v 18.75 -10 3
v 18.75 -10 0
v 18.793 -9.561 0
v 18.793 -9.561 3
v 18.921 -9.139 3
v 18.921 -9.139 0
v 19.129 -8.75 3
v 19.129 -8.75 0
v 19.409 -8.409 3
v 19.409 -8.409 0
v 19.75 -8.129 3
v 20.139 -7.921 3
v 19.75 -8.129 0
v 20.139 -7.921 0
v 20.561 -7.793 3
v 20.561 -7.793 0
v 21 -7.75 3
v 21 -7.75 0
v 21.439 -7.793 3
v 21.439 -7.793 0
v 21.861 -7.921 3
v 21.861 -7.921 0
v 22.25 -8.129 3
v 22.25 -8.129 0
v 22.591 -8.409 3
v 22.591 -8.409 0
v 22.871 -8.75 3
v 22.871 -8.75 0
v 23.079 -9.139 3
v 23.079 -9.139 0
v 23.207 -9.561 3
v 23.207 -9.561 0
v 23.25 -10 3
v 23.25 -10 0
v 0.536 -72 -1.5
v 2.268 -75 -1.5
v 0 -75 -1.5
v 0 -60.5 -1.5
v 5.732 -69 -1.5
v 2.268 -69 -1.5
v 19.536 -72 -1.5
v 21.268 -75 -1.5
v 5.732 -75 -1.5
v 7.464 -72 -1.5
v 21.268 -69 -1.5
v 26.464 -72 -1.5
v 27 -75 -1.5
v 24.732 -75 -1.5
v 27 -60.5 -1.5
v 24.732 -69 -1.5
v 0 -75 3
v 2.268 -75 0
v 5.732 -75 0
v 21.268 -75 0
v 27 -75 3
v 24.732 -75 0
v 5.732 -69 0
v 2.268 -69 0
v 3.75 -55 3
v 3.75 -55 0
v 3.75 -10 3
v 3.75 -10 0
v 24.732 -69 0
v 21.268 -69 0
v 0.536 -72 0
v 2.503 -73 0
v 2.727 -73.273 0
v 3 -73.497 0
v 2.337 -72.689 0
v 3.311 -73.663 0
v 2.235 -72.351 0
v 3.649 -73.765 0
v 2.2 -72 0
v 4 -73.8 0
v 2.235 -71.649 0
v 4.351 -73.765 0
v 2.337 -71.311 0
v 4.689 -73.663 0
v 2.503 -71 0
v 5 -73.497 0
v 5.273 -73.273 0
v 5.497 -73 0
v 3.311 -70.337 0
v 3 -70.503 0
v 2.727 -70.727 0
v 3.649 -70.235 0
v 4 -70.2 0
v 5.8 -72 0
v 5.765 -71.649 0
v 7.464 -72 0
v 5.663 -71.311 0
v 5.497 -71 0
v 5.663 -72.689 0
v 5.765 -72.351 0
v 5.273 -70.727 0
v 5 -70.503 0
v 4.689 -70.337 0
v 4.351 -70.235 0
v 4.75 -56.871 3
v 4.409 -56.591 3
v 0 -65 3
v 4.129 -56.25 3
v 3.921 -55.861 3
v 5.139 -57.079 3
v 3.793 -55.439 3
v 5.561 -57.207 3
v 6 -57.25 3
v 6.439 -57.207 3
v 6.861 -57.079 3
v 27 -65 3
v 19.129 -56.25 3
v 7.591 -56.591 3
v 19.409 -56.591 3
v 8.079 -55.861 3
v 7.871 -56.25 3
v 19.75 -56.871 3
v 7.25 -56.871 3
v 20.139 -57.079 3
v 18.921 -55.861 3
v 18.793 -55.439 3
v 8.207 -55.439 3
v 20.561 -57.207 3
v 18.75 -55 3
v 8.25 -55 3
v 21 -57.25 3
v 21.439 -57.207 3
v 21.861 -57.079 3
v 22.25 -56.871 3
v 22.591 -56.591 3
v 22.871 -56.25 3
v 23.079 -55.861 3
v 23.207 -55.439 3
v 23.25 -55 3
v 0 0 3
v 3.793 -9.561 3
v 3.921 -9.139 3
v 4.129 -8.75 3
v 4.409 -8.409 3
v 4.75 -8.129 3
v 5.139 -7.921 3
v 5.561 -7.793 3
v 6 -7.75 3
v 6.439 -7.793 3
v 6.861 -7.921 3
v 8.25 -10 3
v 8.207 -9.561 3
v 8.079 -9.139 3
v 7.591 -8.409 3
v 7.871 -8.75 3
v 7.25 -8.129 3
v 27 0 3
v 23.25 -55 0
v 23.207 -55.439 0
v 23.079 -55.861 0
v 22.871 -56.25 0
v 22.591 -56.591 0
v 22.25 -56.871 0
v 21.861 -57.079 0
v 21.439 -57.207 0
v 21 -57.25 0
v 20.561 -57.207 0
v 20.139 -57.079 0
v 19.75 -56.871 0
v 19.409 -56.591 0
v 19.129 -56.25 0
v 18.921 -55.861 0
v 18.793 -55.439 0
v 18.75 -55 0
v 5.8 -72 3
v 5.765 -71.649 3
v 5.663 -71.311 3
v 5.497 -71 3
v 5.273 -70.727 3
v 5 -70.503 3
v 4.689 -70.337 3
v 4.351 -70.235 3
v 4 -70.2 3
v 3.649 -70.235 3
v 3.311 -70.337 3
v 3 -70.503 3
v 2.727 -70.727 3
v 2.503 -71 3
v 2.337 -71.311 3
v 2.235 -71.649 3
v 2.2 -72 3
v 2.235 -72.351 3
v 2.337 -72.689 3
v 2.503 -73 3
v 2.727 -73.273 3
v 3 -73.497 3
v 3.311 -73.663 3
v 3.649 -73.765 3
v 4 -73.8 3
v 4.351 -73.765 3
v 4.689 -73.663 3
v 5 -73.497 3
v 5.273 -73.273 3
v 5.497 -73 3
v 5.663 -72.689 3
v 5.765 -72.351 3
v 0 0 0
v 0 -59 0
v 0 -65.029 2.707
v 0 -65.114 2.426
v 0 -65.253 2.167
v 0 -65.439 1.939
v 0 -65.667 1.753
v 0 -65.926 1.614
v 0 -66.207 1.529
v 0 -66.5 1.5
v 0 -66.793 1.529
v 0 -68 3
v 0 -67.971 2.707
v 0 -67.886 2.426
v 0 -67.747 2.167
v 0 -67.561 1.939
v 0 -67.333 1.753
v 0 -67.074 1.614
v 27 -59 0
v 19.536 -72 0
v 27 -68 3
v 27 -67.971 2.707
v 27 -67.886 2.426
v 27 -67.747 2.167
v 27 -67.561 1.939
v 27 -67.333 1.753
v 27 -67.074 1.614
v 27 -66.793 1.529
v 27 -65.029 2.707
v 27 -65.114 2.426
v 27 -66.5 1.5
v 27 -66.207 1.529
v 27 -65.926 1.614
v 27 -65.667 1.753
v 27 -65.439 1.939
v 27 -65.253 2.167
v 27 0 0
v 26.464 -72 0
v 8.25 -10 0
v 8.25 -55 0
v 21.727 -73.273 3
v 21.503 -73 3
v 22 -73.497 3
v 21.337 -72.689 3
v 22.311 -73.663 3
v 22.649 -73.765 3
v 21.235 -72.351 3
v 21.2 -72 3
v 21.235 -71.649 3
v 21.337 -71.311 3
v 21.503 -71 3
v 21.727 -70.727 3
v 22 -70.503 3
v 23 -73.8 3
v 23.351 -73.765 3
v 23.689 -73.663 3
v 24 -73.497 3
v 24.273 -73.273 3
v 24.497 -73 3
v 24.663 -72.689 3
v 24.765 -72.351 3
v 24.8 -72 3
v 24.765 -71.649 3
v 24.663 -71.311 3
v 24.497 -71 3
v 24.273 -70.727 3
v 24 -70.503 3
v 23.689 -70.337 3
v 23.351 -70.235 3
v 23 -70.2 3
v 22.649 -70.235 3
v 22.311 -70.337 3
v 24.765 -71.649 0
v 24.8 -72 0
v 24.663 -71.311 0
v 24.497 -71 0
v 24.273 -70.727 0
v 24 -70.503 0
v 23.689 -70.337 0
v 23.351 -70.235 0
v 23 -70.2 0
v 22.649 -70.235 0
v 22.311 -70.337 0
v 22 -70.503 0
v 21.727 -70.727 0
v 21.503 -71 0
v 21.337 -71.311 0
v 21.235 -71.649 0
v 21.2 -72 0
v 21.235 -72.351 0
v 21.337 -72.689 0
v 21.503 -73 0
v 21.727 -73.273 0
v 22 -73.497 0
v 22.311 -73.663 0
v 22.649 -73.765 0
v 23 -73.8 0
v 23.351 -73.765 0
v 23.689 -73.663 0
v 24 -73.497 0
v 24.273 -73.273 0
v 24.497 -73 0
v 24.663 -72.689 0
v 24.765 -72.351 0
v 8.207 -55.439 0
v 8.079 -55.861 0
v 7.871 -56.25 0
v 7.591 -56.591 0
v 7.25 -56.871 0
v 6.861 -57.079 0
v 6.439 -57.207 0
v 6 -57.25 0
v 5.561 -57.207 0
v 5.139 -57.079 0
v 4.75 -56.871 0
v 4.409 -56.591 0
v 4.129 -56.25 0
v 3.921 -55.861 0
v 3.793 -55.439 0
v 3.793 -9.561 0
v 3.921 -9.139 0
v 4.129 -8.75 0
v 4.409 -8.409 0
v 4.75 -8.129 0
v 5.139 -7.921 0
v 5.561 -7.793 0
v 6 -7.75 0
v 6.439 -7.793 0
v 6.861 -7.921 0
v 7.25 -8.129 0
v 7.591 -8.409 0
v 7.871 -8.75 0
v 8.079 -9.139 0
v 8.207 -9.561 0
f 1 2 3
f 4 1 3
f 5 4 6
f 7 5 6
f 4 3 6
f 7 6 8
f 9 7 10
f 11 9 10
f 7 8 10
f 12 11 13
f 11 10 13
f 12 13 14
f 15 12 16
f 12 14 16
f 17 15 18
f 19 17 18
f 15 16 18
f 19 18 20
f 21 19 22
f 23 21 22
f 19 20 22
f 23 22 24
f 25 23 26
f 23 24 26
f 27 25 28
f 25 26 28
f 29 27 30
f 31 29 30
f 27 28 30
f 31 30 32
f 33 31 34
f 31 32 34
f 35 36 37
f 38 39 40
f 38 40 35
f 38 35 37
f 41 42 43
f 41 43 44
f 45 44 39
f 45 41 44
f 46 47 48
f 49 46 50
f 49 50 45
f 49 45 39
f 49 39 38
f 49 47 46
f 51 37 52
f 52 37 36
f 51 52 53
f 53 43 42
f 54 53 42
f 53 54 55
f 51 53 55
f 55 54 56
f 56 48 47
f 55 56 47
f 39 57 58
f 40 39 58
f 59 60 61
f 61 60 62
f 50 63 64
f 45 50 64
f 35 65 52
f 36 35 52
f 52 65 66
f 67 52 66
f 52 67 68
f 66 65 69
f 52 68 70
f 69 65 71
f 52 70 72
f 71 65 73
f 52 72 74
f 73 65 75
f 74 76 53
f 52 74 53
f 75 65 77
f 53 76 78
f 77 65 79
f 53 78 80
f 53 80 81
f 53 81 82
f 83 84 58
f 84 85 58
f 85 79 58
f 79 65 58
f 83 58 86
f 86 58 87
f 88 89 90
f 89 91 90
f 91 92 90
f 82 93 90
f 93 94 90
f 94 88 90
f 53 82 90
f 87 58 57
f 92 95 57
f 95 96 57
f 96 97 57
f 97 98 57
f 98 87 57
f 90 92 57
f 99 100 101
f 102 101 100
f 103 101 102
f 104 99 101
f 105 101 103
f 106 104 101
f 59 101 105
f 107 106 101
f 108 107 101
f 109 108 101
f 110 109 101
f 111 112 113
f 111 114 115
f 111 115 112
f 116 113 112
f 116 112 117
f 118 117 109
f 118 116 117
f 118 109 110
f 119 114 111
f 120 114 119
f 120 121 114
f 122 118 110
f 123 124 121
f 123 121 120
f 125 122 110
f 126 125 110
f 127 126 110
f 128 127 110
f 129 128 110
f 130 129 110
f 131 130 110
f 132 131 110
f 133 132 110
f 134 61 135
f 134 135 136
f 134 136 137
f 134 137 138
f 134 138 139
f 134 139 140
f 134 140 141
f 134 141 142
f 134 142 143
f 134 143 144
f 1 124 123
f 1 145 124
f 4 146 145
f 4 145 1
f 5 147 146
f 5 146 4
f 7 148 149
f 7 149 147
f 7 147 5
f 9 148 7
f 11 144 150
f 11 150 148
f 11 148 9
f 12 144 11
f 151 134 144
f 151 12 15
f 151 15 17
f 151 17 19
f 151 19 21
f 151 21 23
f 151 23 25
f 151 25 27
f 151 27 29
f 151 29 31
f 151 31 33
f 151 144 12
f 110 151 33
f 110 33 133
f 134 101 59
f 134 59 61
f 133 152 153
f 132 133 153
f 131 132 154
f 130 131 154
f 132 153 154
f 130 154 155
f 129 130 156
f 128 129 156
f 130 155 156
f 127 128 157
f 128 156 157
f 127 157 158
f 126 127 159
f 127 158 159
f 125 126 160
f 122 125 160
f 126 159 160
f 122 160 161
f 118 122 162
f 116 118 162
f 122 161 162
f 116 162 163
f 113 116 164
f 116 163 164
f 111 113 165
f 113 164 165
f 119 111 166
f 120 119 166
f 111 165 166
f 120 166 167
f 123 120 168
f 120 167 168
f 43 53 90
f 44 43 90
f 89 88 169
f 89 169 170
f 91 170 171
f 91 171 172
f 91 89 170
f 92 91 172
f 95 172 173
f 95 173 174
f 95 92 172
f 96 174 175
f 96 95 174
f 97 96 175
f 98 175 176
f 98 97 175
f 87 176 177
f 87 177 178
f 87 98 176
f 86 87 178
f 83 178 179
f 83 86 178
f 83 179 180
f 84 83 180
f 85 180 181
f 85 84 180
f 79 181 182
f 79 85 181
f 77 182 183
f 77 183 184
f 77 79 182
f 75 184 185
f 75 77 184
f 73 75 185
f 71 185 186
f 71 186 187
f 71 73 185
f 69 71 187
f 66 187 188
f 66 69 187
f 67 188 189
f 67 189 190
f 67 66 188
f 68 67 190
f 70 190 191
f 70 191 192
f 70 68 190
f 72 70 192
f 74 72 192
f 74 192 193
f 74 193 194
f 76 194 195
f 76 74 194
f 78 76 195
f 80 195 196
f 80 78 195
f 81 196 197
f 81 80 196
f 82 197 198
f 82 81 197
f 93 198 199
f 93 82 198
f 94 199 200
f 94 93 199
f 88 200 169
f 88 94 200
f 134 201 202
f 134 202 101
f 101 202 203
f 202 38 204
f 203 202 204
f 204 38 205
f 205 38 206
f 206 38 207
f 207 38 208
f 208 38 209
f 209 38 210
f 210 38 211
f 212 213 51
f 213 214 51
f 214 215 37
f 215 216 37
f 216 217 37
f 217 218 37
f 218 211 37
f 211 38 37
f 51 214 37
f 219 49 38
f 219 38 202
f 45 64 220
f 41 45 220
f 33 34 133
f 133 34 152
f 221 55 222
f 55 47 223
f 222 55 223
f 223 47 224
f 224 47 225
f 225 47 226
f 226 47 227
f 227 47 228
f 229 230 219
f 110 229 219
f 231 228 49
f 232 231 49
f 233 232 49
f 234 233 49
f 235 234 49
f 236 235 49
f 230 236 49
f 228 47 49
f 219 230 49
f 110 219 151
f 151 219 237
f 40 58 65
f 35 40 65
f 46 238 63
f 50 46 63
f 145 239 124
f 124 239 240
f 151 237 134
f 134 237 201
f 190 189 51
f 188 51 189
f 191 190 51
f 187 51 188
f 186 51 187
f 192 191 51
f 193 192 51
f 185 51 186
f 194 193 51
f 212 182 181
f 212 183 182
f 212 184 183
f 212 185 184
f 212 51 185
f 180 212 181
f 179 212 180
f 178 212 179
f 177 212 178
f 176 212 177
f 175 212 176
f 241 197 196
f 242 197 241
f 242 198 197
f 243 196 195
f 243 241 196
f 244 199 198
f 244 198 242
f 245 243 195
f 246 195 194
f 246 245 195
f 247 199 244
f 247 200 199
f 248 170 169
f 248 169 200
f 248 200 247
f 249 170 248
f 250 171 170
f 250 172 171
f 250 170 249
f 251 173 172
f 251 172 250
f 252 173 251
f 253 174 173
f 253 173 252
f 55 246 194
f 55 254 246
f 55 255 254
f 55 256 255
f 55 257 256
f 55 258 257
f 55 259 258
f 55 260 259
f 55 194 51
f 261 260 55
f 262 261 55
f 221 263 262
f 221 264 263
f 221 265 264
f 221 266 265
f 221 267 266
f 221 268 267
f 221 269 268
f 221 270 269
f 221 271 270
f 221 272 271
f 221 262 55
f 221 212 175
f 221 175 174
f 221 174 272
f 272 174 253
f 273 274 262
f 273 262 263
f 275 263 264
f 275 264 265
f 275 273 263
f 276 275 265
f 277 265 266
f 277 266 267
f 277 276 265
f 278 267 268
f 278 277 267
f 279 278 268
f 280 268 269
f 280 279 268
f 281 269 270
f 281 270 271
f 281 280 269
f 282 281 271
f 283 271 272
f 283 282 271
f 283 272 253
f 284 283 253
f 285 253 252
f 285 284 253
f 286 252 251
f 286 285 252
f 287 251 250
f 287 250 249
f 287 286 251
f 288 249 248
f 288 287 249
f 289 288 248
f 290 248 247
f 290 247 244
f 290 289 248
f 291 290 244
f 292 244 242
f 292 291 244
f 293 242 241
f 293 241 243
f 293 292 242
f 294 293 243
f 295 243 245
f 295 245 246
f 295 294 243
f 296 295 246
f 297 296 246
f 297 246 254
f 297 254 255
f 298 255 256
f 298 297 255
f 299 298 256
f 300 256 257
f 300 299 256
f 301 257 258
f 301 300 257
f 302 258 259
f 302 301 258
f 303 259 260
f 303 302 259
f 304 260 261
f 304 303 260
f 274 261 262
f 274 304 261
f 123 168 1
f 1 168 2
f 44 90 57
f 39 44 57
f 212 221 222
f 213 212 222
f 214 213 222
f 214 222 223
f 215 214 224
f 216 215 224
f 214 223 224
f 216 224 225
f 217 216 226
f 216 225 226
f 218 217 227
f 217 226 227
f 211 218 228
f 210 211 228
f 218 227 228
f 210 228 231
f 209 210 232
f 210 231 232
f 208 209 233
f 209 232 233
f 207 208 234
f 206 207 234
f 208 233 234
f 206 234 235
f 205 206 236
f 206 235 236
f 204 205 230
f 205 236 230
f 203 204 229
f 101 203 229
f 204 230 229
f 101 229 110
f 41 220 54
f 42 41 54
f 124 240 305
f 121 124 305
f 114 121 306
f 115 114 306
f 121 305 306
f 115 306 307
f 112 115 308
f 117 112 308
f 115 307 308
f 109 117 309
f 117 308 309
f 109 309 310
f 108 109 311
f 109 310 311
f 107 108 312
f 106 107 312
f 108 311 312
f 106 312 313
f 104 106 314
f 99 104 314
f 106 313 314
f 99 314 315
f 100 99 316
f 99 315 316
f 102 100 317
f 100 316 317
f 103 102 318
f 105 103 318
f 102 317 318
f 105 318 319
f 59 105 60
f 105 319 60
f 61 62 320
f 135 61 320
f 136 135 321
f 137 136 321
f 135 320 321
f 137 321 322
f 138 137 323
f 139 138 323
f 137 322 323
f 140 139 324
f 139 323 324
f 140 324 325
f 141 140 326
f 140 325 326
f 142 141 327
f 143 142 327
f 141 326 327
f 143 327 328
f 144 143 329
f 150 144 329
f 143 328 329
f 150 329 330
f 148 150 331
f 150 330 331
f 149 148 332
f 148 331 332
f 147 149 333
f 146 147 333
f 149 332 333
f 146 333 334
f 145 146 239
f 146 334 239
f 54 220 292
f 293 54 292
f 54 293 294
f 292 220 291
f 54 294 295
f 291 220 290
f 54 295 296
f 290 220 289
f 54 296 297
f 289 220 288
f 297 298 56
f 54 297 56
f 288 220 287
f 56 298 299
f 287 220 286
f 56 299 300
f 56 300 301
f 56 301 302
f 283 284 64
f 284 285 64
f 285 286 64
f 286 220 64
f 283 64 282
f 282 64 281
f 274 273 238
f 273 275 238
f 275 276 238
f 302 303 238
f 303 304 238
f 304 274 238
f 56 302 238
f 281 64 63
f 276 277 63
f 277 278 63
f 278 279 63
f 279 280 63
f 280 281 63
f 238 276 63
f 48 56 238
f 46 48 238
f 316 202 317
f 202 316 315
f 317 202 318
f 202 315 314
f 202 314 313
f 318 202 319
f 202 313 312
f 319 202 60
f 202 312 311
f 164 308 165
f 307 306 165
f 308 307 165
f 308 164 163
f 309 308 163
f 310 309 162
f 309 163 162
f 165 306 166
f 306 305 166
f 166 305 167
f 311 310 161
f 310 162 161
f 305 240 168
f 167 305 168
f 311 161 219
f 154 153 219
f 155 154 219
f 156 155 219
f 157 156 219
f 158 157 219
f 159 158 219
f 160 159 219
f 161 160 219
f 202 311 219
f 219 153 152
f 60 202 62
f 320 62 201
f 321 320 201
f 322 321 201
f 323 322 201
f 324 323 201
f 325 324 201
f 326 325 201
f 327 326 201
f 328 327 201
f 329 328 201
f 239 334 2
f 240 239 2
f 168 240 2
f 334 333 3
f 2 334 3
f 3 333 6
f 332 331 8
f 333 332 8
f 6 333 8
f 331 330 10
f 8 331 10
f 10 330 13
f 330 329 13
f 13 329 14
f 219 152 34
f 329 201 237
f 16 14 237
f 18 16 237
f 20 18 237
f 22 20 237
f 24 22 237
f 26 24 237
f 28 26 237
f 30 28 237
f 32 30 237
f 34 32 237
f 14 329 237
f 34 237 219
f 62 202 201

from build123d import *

# Parameters (mm, degrees)
F0_R     = 1.8
F1_DEPTH = 3
F3_DEPTH = 27
F4_DEPTH = 27
F5_DEPTH = 1.5


with BuildPart() as f1:
    # F0 (on Top) → F1 (new body)
    with BuildSketch(Plane.XY):
        Polygon((27, 0), (0, 0), (0, -75), (2.2679491924, -75), (0.5358983849, -72), (2.2679491924, -69), (5.7320508076, -69), (7.4641016151, -72), (5.7320508076, -75), (21.2679491924, -75), (19.5358983849, -72), (21.2679491924, -69), (24.7320508076, -69), (26.4641016151, -72), (24.7320508076, -75), (27, -75), align=None)
        with BuildLine():
            Line((3.75, -55), (3.75, -10))
            ThreePointArc((3.75, -10), (6, -7.75), (8.25, -10))
            Line((8.25, -10), (8.25, -55))
            ThreePointArc((8.25, -55), (6, -57.25), (3.75, -55))
        make_face(mode=Mode.SUBTRACT)
        with BuildLine():
            Line((18.75, -55), (18.75, -10))
            ThreePointArc((18.75, -10), (21, -7.75), (23.25, -10))
            Line((23.25, -10), (23.25, -55))
            ThreePointArc((23.25, -55), (21, -57.25), (18.75, -55))
        make_face(mode=Mode.SUBTRACT)
        Polygon((21.2679491924, -75), (24.7320508076, -75), (26.4641016151, -72), (24.7320508076, -69), (21.2679491924, -69), (19.5358983849, -72), align=None)
        with Locations((23, -72)):
            Circle(F0_R, mode=Mode.SUBTRACT)
        Polygon((0.5358983849, -72), (2.2679491924, -75), (5.7320508076, -75), (7.4641016151, -72), (5.7320508076, -69), (2.2679491924, -69), align=None)
        with Locations((4, -72)):
            Circle(F0_R, mode=Mode.SUBTRACT)
    extrude(amount=F1_DEPTH)

    # F2 (on face) → F3 (cut, through all)
    with BuildSketch(Plane.YZ.offset(27)):
        with BuildLine():
            Line((-65, 3), (-68, 3))
            ThreePointArc((-68, 3), (-66.5, 1.5), (-65, 3))
        make_face()
    extrude(amount=-F3_DEPTH, mode=Mode.SUBTRACT)

    # F2 (on face) → F4 (join, through all)
    with BuildSketch(Plane.YZ.offset(27)):
        Polygon((-59, 0), (-75, 0), (-75, -1.5), (-60.5, -1.5), align=None)
    extrude(amount=-F4_DEPTH)

    # F0 (on Top) → F5 (cut, through all)
    with BuildSketch(Plane.XY):
        Polygon((0.5358983849, -72), (2.2679491924, -75), (5.7320508076, -75), (7.4641016151, -72), (5.7320508076, -69), (2.2679491924, -69), align=None)
        with Locations((4, -72)):
            Circle(F0_R, mode=Mode.SUBTRACT)
        Polygon((21.2679491924, -75), (24.7320508076, -75), (26.4641016151, -72), (24.7320508076, -69), (21.2679491924, -69), (19.5358983849, -72), align=None)
        with Locations((23, -72)):
            Circle(F0_R, mode=Mode.SUBTRACT)
        with Locations((4, -72)):
            Circle(F0_R)
        with Locations((23, -72)):
            Circle(F0_R)
    extrude(amount=-F5_DEPTH, mode=Mode.SUBTRACT)


solid = f1.part
